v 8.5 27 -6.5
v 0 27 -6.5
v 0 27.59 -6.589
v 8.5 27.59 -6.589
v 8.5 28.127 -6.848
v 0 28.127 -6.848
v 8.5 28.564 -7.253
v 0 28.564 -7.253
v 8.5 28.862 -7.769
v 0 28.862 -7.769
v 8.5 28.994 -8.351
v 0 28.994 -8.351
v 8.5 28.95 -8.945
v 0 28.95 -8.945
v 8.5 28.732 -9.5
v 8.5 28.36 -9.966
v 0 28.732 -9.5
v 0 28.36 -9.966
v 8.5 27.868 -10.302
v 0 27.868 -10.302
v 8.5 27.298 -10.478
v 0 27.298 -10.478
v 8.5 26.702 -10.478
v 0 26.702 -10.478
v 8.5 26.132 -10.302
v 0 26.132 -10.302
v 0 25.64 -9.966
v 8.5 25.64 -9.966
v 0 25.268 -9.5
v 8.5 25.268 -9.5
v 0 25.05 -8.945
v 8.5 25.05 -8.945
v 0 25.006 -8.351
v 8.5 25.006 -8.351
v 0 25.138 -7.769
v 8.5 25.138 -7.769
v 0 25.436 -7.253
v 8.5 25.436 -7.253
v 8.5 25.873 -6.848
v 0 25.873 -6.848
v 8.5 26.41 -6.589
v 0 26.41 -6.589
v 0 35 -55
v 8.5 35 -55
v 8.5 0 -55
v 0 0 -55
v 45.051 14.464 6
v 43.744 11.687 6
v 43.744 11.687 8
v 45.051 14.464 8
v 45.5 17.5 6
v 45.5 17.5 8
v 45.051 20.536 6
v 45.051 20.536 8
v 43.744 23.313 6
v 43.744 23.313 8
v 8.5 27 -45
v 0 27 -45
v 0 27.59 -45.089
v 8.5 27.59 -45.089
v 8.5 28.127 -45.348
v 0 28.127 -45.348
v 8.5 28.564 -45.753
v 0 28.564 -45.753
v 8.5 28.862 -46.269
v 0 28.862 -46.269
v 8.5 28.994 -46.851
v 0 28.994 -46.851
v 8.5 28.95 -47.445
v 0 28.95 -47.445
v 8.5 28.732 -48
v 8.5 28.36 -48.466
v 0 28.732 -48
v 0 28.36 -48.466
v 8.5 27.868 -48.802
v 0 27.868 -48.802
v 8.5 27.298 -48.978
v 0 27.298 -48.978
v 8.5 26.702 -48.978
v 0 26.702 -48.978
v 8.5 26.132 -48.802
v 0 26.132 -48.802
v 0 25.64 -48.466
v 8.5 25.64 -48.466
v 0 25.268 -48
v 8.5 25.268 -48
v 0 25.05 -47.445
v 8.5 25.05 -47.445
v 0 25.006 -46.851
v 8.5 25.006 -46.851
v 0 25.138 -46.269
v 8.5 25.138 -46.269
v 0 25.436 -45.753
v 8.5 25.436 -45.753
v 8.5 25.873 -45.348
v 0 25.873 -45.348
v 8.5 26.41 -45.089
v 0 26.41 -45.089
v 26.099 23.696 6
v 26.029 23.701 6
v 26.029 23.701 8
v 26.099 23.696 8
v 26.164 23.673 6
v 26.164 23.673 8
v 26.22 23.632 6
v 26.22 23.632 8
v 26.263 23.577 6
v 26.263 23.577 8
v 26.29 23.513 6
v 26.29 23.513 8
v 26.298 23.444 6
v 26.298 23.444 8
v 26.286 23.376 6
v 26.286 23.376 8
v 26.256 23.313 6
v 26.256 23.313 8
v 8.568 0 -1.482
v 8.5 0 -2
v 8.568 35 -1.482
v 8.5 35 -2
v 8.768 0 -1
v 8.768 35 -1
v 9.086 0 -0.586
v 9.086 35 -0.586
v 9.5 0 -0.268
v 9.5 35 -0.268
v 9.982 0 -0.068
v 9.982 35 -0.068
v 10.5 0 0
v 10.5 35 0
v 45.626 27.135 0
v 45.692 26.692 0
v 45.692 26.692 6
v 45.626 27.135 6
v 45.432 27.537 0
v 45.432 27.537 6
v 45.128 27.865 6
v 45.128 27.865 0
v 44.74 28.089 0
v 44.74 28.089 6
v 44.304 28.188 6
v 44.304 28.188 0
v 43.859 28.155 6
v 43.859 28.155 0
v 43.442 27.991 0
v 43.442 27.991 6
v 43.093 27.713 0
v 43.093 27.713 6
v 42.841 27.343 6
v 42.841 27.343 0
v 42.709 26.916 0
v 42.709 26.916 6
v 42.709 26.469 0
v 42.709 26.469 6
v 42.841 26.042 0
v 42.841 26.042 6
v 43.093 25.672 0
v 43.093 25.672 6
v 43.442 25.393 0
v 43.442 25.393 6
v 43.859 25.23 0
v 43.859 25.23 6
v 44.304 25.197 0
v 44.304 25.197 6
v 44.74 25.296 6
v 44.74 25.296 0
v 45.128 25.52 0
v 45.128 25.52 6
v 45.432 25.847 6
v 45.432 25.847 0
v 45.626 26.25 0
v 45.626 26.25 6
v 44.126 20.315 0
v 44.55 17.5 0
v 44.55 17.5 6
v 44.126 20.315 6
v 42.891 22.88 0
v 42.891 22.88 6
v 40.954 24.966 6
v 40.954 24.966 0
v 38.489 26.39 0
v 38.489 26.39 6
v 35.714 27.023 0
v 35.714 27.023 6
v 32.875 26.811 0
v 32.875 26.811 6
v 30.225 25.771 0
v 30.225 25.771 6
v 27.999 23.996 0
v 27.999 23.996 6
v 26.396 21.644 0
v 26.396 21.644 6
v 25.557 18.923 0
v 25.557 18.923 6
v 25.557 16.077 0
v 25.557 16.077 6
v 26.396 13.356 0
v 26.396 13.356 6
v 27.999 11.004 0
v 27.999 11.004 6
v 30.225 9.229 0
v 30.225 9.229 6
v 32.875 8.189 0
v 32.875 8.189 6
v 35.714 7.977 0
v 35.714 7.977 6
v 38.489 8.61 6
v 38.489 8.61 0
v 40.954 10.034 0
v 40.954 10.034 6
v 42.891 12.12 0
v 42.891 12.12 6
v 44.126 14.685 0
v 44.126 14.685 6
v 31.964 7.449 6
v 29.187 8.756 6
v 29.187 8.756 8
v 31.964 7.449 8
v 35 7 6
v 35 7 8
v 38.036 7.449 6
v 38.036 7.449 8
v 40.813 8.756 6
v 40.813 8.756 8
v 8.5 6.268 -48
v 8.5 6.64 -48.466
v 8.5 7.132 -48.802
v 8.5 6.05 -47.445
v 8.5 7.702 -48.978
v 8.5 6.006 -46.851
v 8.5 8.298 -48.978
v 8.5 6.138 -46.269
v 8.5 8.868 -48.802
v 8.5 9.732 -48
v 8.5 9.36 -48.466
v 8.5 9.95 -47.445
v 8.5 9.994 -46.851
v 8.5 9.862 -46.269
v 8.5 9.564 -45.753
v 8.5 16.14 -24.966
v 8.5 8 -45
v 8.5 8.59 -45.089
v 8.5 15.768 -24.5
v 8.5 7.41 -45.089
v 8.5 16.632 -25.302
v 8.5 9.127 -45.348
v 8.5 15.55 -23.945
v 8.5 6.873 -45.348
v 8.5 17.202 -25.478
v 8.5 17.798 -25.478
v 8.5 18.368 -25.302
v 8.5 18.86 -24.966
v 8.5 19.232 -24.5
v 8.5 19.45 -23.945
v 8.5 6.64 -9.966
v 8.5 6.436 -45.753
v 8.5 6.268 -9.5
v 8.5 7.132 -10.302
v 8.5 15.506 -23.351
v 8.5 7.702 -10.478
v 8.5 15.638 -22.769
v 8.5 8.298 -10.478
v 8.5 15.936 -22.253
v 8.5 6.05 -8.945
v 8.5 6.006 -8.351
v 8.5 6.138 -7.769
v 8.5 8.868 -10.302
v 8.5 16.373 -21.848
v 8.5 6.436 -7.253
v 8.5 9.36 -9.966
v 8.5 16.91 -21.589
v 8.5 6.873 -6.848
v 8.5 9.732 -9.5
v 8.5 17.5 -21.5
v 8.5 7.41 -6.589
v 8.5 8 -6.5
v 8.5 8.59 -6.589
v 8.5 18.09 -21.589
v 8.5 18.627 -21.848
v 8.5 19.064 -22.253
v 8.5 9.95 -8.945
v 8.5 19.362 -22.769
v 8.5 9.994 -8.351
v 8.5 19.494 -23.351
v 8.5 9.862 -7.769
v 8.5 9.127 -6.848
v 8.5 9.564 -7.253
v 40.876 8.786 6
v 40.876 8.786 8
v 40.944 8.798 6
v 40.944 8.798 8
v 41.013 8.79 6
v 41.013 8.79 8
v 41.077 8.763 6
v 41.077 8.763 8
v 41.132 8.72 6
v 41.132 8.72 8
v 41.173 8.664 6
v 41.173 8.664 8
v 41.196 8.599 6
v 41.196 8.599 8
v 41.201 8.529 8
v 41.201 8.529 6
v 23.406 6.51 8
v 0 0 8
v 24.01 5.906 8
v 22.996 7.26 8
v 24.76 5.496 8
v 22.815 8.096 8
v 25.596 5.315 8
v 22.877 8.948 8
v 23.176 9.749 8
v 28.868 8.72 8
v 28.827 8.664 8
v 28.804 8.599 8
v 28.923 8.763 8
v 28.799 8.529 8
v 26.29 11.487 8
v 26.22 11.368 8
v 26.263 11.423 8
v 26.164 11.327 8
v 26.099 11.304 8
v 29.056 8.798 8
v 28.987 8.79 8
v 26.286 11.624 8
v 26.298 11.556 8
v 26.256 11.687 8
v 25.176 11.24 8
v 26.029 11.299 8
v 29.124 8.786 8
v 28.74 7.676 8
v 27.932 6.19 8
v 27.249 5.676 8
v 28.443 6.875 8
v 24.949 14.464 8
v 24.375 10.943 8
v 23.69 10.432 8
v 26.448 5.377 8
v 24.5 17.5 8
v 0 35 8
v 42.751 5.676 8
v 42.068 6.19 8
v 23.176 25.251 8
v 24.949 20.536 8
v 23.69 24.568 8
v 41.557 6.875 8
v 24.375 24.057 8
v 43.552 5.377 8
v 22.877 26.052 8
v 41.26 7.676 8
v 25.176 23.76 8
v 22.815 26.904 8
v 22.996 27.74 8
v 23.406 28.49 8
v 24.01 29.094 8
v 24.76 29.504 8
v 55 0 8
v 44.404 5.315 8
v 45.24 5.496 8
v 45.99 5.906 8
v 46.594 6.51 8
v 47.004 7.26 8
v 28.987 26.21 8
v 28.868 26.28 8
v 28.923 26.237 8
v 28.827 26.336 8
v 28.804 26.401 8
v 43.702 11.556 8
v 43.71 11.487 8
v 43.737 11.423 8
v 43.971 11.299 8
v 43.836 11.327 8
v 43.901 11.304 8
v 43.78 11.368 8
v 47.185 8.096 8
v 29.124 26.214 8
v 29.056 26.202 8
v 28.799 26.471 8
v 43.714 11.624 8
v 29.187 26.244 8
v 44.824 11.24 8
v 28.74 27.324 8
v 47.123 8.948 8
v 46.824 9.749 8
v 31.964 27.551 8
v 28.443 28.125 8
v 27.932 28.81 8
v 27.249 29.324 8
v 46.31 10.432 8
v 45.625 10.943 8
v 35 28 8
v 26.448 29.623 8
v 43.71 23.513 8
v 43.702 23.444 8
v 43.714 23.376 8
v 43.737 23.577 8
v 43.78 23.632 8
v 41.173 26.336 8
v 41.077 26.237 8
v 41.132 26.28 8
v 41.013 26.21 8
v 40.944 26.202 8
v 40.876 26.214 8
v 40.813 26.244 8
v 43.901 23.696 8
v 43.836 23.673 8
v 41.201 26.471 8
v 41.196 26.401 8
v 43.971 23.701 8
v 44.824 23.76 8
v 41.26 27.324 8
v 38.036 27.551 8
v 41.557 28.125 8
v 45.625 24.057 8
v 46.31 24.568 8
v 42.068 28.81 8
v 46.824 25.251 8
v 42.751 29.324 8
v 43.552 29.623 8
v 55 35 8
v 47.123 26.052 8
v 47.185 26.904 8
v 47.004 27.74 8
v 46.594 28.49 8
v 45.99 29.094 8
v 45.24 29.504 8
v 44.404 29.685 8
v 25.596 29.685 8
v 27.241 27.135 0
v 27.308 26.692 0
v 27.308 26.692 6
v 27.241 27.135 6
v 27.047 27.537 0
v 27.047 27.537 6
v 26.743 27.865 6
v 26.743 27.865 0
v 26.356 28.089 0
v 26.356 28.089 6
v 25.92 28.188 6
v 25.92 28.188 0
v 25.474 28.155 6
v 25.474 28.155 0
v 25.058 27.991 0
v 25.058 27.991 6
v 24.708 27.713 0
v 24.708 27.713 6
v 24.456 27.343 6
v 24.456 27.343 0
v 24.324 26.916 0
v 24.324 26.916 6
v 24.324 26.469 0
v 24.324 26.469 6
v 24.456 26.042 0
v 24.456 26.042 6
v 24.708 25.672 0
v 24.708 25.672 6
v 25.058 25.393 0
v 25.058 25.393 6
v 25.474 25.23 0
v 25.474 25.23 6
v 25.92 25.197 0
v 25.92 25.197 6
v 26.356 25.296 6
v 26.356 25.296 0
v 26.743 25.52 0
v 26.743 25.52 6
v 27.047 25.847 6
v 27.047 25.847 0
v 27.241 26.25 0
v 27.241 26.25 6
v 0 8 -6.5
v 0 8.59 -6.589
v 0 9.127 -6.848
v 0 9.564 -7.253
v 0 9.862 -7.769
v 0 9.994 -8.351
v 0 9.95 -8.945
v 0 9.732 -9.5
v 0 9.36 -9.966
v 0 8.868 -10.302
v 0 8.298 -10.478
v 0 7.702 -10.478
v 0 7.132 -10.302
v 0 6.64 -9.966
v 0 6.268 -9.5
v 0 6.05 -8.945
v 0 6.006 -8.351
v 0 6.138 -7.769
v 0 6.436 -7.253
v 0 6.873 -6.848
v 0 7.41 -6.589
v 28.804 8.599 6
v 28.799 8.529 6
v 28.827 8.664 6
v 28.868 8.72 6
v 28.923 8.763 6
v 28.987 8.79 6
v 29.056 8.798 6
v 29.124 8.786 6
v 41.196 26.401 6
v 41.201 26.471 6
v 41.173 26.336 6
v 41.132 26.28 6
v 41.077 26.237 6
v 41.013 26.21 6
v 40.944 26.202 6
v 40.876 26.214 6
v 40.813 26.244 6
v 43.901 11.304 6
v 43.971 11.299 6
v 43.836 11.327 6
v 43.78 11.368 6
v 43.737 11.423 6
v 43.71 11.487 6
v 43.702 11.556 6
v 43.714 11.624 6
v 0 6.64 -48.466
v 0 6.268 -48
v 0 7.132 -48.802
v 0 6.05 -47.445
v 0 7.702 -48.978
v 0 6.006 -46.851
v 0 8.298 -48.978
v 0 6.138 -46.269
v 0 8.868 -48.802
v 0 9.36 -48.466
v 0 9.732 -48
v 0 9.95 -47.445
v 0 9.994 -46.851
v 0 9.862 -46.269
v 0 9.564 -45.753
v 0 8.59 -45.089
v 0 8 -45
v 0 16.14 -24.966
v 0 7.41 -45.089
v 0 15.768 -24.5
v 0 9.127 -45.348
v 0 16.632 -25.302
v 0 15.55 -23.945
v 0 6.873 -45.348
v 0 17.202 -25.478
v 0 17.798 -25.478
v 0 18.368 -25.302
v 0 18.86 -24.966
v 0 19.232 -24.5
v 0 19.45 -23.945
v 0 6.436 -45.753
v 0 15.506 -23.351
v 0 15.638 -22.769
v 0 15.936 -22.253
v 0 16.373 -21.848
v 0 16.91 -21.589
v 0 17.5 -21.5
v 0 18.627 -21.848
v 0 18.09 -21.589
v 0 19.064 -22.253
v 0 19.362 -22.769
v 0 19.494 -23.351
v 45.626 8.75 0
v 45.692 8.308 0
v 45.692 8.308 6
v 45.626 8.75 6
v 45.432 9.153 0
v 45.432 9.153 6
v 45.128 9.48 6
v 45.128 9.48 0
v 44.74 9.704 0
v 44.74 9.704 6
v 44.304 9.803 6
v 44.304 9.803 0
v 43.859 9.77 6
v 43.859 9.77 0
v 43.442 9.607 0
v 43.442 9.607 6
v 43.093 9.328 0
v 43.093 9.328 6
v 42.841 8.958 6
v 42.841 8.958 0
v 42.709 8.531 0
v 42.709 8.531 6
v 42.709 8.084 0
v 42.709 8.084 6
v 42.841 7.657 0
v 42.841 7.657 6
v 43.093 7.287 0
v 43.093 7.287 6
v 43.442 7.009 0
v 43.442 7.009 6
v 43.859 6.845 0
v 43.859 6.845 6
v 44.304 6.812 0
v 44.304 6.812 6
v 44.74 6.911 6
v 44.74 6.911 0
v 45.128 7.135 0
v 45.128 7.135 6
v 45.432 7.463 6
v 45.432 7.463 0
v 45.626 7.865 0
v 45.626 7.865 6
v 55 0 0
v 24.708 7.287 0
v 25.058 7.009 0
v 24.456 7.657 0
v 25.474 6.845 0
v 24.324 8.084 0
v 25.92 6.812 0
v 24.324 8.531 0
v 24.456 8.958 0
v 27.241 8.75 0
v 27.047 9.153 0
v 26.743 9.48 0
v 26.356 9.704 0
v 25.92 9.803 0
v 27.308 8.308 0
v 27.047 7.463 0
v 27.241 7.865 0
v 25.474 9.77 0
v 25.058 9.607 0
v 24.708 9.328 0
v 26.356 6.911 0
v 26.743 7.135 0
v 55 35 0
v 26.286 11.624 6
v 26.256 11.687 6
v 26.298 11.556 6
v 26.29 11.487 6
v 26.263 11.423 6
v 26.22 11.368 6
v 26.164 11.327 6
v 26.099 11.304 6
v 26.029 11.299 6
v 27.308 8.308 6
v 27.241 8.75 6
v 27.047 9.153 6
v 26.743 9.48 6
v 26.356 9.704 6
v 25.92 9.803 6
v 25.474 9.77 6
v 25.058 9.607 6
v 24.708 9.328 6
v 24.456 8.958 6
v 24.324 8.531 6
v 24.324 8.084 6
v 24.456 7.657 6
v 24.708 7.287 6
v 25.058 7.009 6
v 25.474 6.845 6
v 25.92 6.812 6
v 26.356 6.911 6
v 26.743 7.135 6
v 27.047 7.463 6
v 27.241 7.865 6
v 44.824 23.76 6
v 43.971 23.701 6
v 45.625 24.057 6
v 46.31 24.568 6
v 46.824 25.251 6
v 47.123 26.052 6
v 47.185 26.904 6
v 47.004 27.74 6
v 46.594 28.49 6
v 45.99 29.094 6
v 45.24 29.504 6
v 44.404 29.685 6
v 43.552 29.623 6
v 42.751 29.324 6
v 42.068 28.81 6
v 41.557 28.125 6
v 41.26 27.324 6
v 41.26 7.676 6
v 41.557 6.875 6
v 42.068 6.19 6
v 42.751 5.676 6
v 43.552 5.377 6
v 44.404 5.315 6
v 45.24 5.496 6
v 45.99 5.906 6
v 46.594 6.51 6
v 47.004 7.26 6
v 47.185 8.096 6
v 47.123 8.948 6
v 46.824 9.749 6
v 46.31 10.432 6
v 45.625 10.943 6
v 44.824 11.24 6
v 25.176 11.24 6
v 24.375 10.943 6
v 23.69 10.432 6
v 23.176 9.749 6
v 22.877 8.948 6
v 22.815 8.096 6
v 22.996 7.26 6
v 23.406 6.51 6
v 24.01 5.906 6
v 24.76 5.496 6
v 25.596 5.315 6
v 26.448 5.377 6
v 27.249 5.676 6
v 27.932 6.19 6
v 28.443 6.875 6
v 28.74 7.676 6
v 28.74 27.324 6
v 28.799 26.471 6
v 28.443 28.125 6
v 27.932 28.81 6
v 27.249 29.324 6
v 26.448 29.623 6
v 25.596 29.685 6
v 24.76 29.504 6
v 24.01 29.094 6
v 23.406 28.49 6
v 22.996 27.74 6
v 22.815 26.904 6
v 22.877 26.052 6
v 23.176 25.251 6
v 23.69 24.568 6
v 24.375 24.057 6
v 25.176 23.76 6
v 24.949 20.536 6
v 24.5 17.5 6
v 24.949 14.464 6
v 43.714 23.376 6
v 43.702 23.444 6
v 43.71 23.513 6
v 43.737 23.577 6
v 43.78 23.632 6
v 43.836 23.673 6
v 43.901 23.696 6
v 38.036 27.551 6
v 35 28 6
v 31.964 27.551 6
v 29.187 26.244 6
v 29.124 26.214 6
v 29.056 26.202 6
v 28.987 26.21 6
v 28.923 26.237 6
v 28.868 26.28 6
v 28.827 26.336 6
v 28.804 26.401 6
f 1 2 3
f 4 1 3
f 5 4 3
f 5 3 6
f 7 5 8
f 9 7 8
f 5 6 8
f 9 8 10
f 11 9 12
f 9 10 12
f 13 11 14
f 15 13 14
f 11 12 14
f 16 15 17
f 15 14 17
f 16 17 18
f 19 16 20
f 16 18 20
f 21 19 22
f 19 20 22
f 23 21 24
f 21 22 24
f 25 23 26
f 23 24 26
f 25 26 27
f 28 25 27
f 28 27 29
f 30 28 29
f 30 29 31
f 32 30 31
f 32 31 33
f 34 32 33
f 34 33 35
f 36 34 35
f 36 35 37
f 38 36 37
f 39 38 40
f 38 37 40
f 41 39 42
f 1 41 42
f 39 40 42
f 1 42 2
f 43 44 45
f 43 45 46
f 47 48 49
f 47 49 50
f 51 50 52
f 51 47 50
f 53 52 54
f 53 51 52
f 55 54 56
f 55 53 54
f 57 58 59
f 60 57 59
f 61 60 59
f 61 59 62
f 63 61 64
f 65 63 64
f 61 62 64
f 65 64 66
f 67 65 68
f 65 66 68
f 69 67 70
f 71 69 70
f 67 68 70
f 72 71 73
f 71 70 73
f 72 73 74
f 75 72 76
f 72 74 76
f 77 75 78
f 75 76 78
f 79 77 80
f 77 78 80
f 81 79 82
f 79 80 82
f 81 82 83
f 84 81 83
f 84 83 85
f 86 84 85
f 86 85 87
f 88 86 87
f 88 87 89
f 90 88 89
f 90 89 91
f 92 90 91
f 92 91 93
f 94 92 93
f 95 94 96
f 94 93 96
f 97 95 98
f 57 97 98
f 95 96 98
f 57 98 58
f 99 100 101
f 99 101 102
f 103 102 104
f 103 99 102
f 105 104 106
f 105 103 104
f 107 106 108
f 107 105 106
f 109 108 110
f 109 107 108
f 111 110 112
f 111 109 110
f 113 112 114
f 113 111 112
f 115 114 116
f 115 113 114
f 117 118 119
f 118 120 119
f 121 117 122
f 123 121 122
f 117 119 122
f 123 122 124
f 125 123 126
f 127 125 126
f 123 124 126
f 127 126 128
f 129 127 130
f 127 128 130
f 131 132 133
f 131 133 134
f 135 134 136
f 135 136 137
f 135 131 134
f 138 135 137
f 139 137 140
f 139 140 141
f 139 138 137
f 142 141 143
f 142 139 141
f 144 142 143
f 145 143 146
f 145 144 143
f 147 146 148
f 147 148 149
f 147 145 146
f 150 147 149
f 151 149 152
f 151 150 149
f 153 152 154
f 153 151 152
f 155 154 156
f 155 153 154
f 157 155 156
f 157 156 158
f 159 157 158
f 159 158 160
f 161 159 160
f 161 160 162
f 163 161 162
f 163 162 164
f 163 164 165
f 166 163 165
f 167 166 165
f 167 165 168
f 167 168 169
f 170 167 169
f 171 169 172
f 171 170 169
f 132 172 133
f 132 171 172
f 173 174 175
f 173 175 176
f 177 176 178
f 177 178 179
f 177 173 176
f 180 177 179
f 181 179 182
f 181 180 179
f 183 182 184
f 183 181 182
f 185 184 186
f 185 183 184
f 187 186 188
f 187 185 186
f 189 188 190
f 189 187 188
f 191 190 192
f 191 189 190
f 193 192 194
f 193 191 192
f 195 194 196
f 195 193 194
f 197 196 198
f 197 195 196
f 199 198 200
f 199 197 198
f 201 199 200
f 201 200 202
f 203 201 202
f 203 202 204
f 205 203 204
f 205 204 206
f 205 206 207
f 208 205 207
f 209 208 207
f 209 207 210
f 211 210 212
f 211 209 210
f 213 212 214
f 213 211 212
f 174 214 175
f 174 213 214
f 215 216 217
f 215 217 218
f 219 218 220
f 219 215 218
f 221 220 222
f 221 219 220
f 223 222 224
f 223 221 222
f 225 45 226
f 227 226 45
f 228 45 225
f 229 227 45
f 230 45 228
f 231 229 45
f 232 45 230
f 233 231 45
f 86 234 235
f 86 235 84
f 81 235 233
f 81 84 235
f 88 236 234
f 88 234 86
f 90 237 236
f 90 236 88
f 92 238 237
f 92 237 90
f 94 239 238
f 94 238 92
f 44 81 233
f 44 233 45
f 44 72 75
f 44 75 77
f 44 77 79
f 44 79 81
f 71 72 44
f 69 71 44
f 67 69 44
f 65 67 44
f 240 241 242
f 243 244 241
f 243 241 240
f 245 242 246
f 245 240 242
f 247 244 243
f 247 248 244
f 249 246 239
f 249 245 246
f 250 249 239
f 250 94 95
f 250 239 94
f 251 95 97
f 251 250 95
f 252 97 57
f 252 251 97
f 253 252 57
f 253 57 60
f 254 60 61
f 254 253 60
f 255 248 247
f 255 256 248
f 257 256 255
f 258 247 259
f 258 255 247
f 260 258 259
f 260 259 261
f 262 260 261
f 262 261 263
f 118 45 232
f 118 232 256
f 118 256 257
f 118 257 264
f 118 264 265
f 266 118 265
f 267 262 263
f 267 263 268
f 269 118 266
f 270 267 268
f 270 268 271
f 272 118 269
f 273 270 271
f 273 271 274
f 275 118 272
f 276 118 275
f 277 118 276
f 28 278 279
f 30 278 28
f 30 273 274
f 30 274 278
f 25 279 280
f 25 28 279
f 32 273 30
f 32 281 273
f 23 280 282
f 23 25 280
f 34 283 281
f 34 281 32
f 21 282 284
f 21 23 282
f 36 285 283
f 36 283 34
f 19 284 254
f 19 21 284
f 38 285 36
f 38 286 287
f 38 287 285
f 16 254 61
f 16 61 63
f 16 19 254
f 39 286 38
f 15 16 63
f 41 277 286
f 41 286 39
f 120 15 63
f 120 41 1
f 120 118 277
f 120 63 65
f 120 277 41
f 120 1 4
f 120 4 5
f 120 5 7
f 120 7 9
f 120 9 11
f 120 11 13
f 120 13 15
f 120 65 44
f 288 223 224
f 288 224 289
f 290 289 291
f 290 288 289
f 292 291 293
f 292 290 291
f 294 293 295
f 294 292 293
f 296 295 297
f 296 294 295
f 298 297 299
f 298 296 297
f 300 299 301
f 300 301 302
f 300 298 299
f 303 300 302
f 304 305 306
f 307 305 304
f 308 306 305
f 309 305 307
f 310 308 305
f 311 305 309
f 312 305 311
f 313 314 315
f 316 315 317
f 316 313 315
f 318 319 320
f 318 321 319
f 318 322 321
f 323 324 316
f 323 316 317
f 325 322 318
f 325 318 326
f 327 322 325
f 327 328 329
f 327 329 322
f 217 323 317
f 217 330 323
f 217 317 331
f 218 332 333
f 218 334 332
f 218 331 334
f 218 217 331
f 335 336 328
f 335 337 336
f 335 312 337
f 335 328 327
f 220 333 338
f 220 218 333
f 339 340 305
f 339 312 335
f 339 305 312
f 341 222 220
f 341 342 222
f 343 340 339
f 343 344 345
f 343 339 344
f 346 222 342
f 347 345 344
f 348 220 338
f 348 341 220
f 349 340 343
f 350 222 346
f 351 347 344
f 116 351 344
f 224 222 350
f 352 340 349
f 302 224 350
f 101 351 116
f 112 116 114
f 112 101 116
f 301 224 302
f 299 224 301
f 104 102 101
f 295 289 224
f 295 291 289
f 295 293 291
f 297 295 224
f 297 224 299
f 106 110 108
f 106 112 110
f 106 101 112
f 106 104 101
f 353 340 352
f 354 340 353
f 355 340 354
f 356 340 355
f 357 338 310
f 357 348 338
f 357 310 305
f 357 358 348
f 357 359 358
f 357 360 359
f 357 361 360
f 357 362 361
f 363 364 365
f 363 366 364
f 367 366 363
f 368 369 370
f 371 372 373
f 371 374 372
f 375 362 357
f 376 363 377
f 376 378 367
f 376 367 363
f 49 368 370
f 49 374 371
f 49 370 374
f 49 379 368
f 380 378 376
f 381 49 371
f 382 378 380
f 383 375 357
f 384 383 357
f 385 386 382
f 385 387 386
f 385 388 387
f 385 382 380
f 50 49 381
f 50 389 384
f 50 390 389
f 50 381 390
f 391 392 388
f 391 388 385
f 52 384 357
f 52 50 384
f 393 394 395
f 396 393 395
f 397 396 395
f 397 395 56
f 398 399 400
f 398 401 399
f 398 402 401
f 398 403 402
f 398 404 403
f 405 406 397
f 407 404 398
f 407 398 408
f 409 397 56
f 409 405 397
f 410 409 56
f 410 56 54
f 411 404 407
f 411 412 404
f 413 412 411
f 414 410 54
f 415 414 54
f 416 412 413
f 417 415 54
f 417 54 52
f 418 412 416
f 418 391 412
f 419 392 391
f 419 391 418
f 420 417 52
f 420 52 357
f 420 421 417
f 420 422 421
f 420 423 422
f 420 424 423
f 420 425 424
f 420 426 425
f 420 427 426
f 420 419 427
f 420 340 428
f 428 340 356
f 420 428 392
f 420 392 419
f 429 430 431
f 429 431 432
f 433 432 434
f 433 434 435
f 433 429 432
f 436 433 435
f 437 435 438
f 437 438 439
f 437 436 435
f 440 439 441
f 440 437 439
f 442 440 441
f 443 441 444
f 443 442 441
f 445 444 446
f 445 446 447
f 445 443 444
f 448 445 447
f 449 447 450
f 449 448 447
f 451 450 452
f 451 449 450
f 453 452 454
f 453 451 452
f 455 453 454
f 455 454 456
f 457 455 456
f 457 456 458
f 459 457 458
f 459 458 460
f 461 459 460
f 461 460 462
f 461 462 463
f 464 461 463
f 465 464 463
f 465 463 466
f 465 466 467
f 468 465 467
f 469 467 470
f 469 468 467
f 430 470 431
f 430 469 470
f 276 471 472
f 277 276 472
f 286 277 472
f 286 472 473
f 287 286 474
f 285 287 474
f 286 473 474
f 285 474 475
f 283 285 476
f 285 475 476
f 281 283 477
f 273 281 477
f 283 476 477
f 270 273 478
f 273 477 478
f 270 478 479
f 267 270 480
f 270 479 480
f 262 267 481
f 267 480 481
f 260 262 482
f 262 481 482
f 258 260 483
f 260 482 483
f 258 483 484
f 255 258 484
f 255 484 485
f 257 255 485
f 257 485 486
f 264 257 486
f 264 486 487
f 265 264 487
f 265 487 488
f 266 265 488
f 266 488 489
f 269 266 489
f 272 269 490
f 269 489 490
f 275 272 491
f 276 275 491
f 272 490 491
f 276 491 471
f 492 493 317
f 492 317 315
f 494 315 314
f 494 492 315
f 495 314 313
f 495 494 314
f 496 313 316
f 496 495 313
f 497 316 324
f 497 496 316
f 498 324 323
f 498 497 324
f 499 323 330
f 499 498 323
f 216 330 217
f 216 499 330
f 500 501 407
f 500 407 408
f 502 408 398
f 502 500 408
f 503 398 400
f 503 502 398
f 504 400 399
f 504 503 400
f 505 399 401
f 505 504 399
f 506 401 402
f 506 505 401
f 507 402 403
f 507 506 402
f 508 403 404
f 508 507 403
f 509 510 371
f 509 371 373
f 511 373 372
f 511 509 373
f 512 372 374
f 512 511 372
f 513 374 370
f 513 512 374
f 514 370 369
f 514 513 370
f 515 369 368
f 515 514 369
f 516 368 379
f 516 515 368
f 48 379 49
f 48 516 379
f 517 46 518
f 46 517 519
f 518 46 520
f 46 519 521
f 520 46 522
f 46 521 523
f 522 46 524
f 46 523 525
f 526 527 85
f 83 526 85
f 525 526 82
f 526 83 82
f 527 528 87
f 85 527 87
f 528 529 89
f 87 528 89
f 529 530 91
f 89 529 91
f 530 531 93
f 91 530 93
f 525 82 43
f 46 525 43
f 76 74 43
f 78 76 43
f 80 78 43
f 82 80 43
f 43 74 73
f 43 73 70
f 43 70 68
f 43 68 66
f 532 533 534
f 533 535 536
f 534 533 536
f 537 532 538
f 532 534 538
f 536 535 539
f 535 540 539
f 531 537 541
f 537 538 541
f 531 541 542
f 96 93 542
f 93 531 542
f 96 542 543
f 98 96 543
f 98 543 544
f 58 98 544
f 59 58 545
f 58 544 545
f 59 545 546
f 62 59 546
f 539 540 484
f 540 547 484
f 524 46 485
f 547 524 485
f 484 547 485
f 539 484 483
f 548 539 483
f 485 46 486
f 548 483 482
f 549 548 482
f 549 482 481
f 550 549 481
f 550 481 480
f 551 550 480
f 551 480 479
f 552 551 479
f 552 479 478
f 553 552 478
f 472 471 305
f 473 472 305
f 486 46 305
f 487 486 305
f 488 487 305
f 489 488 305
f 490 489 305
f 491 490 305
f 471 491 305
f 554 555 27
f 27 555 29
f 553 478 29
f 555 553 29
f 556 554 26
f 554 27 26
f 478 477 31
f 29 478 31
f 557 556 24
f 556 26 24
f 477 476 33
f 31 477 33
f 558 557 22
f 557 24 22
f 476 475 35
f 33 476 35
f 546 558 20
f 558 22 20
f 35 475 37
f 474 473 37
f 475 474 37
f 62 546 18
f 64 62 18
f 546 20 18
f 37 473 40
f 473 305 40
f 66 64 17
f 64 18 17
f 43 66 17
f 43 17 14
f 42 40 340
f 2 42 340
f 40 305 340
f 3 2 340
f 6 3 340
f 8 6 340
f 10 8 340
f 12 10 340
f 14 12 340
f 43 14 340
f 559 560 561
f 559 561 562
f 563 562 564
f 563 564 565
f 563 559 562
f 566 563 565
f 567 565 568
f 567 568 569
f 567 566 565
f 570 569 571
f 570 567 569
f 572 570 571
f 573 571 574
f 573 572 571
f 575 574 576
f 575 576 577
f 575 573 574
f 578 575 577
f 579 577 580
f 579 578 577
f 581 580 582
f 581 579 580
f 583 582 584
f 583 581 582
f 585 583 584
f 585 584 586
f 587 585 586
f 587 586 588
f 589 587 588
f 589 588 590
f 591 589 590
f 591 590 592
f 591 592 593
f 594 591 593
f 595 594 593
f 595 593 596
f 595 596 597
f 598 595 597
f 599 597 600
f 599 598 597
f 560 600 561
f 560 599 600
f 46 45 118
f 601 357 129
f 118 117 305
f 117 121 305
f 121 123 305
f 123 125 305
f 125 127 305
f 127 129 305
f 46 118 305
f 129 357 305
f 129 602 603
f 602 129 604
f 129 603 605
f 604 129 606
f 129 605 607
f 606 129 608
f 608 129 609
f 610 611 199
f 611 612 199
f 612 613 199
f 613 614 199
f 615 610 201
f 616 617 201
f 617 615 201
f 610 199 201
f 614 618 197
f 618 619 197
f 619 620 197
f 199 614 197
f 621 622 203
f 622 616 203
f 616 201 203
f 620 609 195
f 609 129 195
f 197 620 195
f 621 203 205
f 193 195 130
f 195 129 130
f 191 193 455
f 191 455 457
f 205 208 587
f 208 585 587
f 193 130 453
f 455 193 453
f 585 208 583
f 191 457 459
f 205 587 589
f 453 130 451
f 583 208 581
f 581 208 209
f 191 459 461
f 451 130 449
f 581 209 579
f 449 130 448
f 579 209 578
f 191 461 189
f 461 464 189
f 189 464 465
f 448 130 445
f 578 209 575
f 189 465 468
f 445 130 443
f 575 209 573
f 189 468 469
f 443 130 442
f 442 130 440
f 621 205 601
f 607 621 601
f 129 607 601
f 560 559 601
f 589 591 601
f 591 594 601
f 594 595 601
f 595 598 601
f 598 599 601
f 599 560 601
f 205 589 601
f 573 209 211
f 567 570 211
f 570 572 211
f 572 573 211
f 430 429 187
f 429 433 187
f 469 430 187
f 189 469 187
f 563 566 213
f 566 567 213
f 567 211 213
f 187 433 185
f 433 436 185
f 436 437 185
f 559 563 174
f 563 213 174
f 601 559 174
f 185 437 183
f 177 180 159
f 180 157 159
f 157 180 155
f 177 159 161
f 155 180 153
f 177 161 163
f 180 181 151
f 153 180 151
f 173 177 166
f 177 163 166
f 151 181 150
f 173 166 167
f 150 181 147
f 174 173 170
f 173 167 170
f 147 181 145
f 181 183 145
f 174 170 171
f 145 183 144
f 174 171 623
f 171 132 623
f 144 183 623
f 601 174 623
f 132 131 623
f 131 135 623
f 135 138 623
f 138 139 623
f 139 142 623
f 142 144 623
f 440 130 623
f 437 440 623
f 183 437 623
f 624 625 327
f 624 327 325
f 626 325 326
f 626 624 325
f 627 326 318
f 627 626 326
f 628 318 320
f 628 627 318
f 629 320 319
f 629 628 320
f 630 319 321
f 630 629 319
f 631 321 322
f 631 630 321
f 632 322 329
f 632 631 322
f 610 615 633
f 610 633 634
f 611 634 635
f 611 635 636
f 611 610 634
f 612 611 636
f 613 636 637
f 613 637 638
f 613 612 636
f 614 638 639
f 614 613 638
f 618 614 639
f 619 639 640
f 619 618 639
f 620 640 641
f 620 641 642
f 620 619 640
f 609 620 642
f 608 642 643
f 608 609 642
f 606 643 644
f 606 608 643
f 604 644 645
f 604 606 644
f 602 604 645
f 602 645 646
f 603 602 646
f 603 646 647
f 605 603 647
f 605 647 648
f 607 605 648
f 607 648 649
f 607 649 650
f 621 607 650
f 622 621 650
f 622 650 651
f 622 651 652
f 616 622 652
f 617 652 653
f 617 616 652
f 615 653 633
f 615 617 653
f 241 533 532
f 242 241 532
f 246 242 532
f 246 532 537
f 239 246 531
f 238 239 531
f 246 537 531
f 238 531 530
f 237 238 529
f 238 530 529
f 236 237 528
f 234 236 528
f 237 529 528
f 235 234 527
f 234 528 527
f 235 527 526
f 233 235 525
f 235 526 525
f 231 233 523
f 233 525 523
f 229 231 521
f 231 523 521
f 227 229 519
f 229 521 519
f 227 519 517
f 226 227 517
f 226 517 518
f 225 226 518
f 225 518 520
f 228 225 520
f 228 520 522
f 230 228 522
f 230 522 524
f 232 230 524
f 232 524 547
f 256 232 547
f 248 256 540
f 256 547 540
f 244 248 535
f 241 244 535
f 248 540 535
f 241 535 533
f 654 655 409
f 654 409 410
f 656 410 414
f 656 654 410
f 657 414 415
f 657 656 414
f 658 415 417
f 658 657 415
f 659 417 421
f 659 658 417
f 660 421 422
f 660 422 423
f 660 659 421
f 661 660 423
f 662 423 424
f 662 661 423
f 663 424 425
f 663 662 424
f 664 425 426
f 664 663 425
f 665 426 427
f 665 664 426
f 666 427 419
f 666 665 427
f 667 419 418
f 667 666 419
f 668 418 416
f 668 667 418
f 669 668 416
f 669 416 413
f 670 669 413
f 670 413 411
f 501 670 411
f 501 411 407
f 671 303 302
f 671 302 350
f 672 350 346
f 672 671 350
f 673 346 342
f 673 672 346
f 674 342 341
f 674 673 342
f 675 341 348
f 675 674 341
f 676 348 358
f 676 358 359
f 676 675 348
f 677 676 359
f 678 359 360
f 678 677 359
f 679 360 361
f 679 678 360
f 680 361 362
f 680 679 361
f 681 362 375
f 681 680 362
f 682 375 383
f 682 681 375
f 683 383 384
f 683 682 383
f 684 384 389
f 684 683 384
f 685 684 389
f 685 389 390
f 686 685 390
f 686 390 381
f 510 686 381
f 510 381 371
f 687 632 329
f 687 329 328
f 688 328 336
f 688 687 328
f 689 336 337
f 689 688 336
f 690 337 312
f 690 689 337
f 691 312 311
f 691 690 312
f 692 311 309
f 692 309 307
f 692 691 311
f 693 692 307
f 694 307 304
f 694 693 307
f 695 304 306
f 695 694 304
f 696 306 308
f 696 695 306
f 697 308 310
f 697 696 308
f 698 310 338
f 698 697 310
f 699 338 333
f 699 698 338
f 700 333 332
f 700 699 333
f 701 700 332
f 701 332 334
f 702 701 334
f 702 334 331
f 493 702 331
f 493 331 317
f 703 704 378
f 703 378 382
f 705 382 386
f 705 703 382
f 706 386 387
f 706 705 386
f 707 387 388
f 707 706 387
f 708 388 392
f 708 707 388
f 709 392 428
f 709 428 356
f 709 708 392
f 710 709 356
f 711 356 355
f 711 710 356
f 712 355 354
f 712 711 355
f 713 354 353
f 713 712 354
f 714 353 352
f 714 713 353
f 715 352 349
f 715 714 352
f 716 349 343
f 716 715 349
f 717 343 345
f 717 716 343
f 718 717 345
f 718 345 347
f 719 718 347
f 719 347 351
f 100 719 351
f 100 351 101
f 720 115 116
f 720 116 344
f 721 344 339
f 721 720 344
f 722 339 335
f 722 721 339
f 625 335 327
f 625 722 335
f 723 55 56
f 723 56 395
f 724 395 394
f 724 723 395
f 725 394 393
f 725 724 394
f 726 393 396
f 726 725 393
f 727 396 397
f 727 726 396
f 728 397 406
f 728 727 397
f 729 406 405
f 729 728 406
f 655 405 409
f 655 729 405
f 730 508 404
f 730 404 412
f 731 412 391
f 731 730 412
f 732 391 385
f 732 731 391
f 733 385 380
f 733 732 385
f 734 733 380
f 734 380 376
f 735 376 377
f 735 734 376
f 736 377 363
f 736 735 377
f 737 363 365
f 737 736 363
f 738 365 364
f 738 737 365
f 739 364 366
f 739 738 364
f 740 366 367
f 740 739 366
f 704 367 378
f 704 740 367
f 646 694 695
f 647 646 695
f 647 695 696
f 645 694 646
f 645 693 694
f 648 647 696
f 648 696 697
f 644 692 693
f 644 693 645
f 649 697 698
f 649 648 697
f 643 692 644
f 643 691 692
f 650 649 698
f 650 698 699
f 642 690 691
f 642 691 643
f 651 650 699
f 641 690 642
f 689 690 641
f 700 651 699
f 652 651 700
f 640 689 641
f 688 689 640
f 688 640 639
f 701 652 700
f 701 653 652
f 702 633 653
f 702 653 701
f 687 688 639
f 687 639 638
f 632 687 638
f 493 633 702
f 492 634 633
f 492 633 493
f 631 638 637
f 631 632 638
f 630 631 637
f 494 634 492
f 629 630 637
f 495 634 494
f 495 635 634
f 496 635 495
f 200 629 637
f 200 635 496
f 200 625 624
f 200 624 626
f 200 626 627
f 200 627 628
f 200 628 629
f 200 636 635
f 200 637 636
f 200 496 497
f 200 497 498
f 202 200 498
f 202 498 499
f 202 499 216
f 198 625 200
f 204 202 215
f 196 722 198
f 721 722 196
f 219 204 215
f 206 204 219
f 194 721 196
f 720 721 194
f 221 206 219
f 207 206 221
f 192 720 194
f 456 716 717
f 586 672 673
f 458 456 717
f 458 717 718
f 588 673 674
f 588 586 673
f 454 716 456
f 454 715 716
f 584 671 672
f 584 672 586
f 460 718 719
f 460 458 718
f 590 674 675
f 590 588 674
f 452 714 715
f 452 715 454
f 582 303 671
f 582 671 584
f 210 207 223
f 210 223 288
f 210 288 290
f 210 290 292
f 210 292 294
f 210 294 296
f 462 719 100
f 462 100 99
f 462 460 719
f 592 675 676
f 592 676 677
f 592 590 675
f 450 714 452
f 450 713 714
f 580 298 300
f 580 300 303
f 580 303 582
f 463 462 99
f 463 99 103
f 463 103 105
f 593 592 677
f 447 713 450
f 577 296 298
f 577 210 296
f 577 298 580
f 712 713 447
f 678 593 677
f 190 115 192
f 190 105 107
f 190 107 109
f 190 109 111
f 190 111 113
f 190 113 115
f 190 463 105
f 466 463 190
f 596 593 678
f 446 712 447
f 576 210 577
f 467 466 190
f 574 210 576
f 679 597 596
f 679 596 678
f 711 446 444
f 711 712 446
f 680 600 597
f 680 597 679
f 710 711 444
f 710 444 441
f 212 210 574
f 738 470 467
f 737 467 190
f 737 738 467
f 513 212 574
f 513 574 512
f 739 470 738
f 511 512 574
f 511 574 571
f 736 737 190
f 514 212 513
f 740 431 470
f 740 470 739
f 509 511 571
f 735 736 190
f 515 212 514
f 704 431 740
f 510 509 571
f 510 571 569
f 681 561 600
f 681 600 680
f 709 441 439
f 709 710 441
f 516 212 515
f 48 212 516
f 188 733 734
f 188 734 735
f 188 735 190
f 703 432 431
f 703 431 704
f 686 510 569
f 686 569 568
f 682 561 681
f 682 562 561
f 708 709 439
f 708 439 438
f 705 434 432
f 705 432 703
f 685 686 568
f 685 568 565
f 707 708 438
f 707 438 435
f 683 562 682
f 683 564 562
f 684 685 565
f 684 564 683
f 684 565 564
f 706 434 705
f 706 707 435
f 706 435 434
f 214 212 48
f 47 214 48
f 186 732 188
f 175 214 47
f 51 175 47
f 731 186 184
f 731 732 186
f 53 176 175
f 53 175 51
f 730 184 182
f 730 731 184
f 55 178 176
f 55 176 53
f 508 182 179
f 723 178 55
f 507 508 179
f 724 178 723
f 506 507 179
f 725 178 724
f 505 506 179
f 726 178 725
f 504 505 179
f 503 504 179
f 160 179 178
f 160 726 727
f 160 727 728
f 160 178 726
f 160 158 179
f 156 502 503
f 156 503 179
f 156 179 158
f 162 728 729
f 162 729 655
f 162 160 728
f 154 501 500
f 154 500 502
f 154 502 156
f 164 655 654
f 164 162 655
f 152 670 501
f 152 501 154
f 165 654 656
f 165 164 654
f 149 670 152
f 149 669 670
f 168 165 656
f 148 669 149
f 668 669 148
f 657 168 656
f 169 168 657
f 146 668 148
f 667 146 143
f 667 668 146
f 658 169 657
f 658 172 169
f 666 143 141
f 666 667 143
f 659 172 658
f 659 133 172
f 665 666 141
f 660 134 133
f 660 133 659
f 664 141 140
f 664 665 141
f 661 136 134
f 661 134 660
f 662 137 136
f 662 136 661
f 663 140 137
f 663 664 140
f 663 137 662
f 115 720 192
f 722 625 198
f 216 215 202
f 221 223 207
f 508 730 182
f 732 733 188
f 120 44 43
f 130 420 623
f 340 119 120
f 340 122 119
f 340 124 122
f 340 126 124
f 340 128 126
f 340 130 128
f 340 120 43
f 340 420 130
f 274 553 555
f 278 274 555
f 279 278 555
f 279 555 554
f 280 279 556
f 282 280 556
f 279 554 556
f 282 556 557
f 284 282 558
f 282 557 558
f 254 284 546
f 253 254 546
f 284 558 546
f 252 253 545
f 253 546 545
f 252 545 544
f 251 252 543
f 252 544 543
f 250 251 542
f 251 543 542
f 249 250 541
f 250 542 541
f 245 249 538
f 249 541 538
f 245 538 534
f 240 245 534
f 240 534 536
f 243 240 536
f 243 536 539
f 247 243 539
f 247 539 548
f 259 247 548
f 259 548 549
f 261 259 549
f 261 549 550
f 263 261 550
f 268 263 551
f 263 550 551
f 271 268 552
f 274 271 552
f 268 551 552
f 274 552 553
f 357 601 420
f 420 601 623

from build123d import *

# Parameters (mm, degrees)
SKETCH1_W           = 55
SKETCH1_H           = 35
SKETCH1_R           = 9.55
SKETCH1_R_2         = 1.5
BOSS_EXTRUDE3_DEPTH = 6
SKETCH4_W           = 55
SKETCH4_H           = 35
BOSS_EXTRUDE5_DEPTH = 2
SKETCH8_W           = 8.5
SKETCH8_H           = 35
BOSS_EXTRUDE6_DEPTH = 55
SKETCH9_R           = 2
CUT_EXTRUDE1_DEPTH  = 8.5
FILLET1_R           = 2


with BuildPart() as part:
    # Sketch1 → Boss-Extrude3 (new body)
    with BuildSketch(Plane.XY):
        with Locations((27.5, 17.5)):
            Rectangle(SKETCH1_W, SKETCH1_H)
        with Locations((35, 17.5)):
            Circle(SKETCH1_R, mode=Mode.SUBTRACT)
        with Locations((44.192388155, 26.692388155)):
            Circle(SKETCH1_R_2, mode=Mode.SUBTRACT)
        with Locations((44.192388155, 8.307611845)):
            Circle(SKETCH1_R_2, mode=Mode.SUBTRACT)
        with Locations((25.807611845, 8.307611845)):
            Circle(SKETCH1_R_2, mode=Mode.SUBTRACT)
        with Locations((25.807611845, 26.692388155)):
            Circle(SKETCH1_R_2, mode=Mode.SUBTRACT)
    extrude(amount=BOSS_EXTRUDE3_DEPTH)

    # Sketch4 → Boss-Extrude5 (add)
    with BuildSketch(Plane.XY.offset(6)):
        with Locations((27.5, 17.5)):
            Rectangle(SKETCH4_W, SKETCH4_H)
        with BuildLine():
            ThreePointArc((28.799419693, 26.47083501), (23.686291501, 28.813708499), (26.02916499, 23.700580307))
            ThreePointArc((26.02916499, 23.700580307), (26.263454109, 23.57743344), (26.255822455, 23.312861521))
            ThreePointArc((26.255822455, 23.312861521), (24.5, 17.5), (26.255822455, 11.687138479))
            ThreePointArc((26.255822455, 11.687138479), (26.263454109, 11.42256656), (26.02916499, 11.299419693))
            ThreePointArc((26.02916499, 11.299419693), (23.686291501, 6.186291501), (28.799419693, 8.52916499))
            ThreePointArc((28.799419693, 8.52916499), (28.92256656, 8.763454109), (29.187138479, 8.755822455))
            ThreePointArc((29.187138479, 8.755822455), (35, 7), (40.812861521, 8.755822455))
            ThreePointArc((40.812861521, 8.755822455), (41.07743344, 8.763454109), (41.200580307, 8.52916499))
            ThreePointArc((41.200580307, 8.52916499), (46.313708499, 6.186291501), (43.97083501, 11.299419693))
            ThreePointArc((43.97083501, 11.299419693), (43.736545891, 11.42256656), (43.744177545, 11.687138479))
            ThreePointArc((43.744177545, 11.687138479), (45.5, 17.5), (43.744177545, 23.312861521))
            ThreePointArc((43.744177545, 23.312861521), (43.736545891, 23.57743344), (43.97083501, 23.700580307))
            ThreePointArc((43.97083501, 23.700580307), (46.313708499, 28.813708499), (41.200580307, 26.47083501))
            ThreePointArc((41.200580307, 26.47083501), (41.07743344, 26.236545891), (40.812861521, 26.244177545))
            ThreePointArc((40.812861521, 26.244177545), (35, 28), (29.187138479, 26.244177545))
            ThreePointArc((29.187138479, 26.244177545), (28.92256656, 26.236545891), (28.799419693, 26.47083501))
        make_face(mode=Mode.SUBTRACT)
    extrude(amount=BOSS_EXTRUDE5_DEPTH)

    # Sketch8 → Boss-Extrude6 (add)
    with BuildSketch(Plane(origin=(0, 0, 0), x_dir=(-1, 0, 0), z_dir=(0, 0, -1))):
        with Locations((-4.25, 17.5)):
            Rectangle(SKETCH8_W, SKETCH8_H)
    extrude(amount=BOSS_EXTRUDE6_DEPTH)

    # Sketch9 → Cut-Extrude1 (cut)
    with BuildSketch(Plane.ZY):
        with Locations((-47, 27)):
            Circle(SKETCH9_R)
        with Locations((-47, 8)):
            Circle(SKETCH9_R)
        with Locations((-8.5, 27)):
            Circle(SKETCH9_R)
        with Locations((-8.5, 8)):
            Circle(SKETCH9_R)
        with Locations((-23.5, 17.5)):
            Circle(SKETCH9_R)
    extrude(amount=-CUT_EXTRUDE1_DEPTH, mode=Mode.SUBTRACT)

    # Fillet1
    fillet1_edges = [part.edges().sort_by_distance(p)[0] for p in [
        (8.5, 17.5, 0),
    ]]
    fillet(fillet1_edges, radius=FILLET1_R)


solid = part.part
